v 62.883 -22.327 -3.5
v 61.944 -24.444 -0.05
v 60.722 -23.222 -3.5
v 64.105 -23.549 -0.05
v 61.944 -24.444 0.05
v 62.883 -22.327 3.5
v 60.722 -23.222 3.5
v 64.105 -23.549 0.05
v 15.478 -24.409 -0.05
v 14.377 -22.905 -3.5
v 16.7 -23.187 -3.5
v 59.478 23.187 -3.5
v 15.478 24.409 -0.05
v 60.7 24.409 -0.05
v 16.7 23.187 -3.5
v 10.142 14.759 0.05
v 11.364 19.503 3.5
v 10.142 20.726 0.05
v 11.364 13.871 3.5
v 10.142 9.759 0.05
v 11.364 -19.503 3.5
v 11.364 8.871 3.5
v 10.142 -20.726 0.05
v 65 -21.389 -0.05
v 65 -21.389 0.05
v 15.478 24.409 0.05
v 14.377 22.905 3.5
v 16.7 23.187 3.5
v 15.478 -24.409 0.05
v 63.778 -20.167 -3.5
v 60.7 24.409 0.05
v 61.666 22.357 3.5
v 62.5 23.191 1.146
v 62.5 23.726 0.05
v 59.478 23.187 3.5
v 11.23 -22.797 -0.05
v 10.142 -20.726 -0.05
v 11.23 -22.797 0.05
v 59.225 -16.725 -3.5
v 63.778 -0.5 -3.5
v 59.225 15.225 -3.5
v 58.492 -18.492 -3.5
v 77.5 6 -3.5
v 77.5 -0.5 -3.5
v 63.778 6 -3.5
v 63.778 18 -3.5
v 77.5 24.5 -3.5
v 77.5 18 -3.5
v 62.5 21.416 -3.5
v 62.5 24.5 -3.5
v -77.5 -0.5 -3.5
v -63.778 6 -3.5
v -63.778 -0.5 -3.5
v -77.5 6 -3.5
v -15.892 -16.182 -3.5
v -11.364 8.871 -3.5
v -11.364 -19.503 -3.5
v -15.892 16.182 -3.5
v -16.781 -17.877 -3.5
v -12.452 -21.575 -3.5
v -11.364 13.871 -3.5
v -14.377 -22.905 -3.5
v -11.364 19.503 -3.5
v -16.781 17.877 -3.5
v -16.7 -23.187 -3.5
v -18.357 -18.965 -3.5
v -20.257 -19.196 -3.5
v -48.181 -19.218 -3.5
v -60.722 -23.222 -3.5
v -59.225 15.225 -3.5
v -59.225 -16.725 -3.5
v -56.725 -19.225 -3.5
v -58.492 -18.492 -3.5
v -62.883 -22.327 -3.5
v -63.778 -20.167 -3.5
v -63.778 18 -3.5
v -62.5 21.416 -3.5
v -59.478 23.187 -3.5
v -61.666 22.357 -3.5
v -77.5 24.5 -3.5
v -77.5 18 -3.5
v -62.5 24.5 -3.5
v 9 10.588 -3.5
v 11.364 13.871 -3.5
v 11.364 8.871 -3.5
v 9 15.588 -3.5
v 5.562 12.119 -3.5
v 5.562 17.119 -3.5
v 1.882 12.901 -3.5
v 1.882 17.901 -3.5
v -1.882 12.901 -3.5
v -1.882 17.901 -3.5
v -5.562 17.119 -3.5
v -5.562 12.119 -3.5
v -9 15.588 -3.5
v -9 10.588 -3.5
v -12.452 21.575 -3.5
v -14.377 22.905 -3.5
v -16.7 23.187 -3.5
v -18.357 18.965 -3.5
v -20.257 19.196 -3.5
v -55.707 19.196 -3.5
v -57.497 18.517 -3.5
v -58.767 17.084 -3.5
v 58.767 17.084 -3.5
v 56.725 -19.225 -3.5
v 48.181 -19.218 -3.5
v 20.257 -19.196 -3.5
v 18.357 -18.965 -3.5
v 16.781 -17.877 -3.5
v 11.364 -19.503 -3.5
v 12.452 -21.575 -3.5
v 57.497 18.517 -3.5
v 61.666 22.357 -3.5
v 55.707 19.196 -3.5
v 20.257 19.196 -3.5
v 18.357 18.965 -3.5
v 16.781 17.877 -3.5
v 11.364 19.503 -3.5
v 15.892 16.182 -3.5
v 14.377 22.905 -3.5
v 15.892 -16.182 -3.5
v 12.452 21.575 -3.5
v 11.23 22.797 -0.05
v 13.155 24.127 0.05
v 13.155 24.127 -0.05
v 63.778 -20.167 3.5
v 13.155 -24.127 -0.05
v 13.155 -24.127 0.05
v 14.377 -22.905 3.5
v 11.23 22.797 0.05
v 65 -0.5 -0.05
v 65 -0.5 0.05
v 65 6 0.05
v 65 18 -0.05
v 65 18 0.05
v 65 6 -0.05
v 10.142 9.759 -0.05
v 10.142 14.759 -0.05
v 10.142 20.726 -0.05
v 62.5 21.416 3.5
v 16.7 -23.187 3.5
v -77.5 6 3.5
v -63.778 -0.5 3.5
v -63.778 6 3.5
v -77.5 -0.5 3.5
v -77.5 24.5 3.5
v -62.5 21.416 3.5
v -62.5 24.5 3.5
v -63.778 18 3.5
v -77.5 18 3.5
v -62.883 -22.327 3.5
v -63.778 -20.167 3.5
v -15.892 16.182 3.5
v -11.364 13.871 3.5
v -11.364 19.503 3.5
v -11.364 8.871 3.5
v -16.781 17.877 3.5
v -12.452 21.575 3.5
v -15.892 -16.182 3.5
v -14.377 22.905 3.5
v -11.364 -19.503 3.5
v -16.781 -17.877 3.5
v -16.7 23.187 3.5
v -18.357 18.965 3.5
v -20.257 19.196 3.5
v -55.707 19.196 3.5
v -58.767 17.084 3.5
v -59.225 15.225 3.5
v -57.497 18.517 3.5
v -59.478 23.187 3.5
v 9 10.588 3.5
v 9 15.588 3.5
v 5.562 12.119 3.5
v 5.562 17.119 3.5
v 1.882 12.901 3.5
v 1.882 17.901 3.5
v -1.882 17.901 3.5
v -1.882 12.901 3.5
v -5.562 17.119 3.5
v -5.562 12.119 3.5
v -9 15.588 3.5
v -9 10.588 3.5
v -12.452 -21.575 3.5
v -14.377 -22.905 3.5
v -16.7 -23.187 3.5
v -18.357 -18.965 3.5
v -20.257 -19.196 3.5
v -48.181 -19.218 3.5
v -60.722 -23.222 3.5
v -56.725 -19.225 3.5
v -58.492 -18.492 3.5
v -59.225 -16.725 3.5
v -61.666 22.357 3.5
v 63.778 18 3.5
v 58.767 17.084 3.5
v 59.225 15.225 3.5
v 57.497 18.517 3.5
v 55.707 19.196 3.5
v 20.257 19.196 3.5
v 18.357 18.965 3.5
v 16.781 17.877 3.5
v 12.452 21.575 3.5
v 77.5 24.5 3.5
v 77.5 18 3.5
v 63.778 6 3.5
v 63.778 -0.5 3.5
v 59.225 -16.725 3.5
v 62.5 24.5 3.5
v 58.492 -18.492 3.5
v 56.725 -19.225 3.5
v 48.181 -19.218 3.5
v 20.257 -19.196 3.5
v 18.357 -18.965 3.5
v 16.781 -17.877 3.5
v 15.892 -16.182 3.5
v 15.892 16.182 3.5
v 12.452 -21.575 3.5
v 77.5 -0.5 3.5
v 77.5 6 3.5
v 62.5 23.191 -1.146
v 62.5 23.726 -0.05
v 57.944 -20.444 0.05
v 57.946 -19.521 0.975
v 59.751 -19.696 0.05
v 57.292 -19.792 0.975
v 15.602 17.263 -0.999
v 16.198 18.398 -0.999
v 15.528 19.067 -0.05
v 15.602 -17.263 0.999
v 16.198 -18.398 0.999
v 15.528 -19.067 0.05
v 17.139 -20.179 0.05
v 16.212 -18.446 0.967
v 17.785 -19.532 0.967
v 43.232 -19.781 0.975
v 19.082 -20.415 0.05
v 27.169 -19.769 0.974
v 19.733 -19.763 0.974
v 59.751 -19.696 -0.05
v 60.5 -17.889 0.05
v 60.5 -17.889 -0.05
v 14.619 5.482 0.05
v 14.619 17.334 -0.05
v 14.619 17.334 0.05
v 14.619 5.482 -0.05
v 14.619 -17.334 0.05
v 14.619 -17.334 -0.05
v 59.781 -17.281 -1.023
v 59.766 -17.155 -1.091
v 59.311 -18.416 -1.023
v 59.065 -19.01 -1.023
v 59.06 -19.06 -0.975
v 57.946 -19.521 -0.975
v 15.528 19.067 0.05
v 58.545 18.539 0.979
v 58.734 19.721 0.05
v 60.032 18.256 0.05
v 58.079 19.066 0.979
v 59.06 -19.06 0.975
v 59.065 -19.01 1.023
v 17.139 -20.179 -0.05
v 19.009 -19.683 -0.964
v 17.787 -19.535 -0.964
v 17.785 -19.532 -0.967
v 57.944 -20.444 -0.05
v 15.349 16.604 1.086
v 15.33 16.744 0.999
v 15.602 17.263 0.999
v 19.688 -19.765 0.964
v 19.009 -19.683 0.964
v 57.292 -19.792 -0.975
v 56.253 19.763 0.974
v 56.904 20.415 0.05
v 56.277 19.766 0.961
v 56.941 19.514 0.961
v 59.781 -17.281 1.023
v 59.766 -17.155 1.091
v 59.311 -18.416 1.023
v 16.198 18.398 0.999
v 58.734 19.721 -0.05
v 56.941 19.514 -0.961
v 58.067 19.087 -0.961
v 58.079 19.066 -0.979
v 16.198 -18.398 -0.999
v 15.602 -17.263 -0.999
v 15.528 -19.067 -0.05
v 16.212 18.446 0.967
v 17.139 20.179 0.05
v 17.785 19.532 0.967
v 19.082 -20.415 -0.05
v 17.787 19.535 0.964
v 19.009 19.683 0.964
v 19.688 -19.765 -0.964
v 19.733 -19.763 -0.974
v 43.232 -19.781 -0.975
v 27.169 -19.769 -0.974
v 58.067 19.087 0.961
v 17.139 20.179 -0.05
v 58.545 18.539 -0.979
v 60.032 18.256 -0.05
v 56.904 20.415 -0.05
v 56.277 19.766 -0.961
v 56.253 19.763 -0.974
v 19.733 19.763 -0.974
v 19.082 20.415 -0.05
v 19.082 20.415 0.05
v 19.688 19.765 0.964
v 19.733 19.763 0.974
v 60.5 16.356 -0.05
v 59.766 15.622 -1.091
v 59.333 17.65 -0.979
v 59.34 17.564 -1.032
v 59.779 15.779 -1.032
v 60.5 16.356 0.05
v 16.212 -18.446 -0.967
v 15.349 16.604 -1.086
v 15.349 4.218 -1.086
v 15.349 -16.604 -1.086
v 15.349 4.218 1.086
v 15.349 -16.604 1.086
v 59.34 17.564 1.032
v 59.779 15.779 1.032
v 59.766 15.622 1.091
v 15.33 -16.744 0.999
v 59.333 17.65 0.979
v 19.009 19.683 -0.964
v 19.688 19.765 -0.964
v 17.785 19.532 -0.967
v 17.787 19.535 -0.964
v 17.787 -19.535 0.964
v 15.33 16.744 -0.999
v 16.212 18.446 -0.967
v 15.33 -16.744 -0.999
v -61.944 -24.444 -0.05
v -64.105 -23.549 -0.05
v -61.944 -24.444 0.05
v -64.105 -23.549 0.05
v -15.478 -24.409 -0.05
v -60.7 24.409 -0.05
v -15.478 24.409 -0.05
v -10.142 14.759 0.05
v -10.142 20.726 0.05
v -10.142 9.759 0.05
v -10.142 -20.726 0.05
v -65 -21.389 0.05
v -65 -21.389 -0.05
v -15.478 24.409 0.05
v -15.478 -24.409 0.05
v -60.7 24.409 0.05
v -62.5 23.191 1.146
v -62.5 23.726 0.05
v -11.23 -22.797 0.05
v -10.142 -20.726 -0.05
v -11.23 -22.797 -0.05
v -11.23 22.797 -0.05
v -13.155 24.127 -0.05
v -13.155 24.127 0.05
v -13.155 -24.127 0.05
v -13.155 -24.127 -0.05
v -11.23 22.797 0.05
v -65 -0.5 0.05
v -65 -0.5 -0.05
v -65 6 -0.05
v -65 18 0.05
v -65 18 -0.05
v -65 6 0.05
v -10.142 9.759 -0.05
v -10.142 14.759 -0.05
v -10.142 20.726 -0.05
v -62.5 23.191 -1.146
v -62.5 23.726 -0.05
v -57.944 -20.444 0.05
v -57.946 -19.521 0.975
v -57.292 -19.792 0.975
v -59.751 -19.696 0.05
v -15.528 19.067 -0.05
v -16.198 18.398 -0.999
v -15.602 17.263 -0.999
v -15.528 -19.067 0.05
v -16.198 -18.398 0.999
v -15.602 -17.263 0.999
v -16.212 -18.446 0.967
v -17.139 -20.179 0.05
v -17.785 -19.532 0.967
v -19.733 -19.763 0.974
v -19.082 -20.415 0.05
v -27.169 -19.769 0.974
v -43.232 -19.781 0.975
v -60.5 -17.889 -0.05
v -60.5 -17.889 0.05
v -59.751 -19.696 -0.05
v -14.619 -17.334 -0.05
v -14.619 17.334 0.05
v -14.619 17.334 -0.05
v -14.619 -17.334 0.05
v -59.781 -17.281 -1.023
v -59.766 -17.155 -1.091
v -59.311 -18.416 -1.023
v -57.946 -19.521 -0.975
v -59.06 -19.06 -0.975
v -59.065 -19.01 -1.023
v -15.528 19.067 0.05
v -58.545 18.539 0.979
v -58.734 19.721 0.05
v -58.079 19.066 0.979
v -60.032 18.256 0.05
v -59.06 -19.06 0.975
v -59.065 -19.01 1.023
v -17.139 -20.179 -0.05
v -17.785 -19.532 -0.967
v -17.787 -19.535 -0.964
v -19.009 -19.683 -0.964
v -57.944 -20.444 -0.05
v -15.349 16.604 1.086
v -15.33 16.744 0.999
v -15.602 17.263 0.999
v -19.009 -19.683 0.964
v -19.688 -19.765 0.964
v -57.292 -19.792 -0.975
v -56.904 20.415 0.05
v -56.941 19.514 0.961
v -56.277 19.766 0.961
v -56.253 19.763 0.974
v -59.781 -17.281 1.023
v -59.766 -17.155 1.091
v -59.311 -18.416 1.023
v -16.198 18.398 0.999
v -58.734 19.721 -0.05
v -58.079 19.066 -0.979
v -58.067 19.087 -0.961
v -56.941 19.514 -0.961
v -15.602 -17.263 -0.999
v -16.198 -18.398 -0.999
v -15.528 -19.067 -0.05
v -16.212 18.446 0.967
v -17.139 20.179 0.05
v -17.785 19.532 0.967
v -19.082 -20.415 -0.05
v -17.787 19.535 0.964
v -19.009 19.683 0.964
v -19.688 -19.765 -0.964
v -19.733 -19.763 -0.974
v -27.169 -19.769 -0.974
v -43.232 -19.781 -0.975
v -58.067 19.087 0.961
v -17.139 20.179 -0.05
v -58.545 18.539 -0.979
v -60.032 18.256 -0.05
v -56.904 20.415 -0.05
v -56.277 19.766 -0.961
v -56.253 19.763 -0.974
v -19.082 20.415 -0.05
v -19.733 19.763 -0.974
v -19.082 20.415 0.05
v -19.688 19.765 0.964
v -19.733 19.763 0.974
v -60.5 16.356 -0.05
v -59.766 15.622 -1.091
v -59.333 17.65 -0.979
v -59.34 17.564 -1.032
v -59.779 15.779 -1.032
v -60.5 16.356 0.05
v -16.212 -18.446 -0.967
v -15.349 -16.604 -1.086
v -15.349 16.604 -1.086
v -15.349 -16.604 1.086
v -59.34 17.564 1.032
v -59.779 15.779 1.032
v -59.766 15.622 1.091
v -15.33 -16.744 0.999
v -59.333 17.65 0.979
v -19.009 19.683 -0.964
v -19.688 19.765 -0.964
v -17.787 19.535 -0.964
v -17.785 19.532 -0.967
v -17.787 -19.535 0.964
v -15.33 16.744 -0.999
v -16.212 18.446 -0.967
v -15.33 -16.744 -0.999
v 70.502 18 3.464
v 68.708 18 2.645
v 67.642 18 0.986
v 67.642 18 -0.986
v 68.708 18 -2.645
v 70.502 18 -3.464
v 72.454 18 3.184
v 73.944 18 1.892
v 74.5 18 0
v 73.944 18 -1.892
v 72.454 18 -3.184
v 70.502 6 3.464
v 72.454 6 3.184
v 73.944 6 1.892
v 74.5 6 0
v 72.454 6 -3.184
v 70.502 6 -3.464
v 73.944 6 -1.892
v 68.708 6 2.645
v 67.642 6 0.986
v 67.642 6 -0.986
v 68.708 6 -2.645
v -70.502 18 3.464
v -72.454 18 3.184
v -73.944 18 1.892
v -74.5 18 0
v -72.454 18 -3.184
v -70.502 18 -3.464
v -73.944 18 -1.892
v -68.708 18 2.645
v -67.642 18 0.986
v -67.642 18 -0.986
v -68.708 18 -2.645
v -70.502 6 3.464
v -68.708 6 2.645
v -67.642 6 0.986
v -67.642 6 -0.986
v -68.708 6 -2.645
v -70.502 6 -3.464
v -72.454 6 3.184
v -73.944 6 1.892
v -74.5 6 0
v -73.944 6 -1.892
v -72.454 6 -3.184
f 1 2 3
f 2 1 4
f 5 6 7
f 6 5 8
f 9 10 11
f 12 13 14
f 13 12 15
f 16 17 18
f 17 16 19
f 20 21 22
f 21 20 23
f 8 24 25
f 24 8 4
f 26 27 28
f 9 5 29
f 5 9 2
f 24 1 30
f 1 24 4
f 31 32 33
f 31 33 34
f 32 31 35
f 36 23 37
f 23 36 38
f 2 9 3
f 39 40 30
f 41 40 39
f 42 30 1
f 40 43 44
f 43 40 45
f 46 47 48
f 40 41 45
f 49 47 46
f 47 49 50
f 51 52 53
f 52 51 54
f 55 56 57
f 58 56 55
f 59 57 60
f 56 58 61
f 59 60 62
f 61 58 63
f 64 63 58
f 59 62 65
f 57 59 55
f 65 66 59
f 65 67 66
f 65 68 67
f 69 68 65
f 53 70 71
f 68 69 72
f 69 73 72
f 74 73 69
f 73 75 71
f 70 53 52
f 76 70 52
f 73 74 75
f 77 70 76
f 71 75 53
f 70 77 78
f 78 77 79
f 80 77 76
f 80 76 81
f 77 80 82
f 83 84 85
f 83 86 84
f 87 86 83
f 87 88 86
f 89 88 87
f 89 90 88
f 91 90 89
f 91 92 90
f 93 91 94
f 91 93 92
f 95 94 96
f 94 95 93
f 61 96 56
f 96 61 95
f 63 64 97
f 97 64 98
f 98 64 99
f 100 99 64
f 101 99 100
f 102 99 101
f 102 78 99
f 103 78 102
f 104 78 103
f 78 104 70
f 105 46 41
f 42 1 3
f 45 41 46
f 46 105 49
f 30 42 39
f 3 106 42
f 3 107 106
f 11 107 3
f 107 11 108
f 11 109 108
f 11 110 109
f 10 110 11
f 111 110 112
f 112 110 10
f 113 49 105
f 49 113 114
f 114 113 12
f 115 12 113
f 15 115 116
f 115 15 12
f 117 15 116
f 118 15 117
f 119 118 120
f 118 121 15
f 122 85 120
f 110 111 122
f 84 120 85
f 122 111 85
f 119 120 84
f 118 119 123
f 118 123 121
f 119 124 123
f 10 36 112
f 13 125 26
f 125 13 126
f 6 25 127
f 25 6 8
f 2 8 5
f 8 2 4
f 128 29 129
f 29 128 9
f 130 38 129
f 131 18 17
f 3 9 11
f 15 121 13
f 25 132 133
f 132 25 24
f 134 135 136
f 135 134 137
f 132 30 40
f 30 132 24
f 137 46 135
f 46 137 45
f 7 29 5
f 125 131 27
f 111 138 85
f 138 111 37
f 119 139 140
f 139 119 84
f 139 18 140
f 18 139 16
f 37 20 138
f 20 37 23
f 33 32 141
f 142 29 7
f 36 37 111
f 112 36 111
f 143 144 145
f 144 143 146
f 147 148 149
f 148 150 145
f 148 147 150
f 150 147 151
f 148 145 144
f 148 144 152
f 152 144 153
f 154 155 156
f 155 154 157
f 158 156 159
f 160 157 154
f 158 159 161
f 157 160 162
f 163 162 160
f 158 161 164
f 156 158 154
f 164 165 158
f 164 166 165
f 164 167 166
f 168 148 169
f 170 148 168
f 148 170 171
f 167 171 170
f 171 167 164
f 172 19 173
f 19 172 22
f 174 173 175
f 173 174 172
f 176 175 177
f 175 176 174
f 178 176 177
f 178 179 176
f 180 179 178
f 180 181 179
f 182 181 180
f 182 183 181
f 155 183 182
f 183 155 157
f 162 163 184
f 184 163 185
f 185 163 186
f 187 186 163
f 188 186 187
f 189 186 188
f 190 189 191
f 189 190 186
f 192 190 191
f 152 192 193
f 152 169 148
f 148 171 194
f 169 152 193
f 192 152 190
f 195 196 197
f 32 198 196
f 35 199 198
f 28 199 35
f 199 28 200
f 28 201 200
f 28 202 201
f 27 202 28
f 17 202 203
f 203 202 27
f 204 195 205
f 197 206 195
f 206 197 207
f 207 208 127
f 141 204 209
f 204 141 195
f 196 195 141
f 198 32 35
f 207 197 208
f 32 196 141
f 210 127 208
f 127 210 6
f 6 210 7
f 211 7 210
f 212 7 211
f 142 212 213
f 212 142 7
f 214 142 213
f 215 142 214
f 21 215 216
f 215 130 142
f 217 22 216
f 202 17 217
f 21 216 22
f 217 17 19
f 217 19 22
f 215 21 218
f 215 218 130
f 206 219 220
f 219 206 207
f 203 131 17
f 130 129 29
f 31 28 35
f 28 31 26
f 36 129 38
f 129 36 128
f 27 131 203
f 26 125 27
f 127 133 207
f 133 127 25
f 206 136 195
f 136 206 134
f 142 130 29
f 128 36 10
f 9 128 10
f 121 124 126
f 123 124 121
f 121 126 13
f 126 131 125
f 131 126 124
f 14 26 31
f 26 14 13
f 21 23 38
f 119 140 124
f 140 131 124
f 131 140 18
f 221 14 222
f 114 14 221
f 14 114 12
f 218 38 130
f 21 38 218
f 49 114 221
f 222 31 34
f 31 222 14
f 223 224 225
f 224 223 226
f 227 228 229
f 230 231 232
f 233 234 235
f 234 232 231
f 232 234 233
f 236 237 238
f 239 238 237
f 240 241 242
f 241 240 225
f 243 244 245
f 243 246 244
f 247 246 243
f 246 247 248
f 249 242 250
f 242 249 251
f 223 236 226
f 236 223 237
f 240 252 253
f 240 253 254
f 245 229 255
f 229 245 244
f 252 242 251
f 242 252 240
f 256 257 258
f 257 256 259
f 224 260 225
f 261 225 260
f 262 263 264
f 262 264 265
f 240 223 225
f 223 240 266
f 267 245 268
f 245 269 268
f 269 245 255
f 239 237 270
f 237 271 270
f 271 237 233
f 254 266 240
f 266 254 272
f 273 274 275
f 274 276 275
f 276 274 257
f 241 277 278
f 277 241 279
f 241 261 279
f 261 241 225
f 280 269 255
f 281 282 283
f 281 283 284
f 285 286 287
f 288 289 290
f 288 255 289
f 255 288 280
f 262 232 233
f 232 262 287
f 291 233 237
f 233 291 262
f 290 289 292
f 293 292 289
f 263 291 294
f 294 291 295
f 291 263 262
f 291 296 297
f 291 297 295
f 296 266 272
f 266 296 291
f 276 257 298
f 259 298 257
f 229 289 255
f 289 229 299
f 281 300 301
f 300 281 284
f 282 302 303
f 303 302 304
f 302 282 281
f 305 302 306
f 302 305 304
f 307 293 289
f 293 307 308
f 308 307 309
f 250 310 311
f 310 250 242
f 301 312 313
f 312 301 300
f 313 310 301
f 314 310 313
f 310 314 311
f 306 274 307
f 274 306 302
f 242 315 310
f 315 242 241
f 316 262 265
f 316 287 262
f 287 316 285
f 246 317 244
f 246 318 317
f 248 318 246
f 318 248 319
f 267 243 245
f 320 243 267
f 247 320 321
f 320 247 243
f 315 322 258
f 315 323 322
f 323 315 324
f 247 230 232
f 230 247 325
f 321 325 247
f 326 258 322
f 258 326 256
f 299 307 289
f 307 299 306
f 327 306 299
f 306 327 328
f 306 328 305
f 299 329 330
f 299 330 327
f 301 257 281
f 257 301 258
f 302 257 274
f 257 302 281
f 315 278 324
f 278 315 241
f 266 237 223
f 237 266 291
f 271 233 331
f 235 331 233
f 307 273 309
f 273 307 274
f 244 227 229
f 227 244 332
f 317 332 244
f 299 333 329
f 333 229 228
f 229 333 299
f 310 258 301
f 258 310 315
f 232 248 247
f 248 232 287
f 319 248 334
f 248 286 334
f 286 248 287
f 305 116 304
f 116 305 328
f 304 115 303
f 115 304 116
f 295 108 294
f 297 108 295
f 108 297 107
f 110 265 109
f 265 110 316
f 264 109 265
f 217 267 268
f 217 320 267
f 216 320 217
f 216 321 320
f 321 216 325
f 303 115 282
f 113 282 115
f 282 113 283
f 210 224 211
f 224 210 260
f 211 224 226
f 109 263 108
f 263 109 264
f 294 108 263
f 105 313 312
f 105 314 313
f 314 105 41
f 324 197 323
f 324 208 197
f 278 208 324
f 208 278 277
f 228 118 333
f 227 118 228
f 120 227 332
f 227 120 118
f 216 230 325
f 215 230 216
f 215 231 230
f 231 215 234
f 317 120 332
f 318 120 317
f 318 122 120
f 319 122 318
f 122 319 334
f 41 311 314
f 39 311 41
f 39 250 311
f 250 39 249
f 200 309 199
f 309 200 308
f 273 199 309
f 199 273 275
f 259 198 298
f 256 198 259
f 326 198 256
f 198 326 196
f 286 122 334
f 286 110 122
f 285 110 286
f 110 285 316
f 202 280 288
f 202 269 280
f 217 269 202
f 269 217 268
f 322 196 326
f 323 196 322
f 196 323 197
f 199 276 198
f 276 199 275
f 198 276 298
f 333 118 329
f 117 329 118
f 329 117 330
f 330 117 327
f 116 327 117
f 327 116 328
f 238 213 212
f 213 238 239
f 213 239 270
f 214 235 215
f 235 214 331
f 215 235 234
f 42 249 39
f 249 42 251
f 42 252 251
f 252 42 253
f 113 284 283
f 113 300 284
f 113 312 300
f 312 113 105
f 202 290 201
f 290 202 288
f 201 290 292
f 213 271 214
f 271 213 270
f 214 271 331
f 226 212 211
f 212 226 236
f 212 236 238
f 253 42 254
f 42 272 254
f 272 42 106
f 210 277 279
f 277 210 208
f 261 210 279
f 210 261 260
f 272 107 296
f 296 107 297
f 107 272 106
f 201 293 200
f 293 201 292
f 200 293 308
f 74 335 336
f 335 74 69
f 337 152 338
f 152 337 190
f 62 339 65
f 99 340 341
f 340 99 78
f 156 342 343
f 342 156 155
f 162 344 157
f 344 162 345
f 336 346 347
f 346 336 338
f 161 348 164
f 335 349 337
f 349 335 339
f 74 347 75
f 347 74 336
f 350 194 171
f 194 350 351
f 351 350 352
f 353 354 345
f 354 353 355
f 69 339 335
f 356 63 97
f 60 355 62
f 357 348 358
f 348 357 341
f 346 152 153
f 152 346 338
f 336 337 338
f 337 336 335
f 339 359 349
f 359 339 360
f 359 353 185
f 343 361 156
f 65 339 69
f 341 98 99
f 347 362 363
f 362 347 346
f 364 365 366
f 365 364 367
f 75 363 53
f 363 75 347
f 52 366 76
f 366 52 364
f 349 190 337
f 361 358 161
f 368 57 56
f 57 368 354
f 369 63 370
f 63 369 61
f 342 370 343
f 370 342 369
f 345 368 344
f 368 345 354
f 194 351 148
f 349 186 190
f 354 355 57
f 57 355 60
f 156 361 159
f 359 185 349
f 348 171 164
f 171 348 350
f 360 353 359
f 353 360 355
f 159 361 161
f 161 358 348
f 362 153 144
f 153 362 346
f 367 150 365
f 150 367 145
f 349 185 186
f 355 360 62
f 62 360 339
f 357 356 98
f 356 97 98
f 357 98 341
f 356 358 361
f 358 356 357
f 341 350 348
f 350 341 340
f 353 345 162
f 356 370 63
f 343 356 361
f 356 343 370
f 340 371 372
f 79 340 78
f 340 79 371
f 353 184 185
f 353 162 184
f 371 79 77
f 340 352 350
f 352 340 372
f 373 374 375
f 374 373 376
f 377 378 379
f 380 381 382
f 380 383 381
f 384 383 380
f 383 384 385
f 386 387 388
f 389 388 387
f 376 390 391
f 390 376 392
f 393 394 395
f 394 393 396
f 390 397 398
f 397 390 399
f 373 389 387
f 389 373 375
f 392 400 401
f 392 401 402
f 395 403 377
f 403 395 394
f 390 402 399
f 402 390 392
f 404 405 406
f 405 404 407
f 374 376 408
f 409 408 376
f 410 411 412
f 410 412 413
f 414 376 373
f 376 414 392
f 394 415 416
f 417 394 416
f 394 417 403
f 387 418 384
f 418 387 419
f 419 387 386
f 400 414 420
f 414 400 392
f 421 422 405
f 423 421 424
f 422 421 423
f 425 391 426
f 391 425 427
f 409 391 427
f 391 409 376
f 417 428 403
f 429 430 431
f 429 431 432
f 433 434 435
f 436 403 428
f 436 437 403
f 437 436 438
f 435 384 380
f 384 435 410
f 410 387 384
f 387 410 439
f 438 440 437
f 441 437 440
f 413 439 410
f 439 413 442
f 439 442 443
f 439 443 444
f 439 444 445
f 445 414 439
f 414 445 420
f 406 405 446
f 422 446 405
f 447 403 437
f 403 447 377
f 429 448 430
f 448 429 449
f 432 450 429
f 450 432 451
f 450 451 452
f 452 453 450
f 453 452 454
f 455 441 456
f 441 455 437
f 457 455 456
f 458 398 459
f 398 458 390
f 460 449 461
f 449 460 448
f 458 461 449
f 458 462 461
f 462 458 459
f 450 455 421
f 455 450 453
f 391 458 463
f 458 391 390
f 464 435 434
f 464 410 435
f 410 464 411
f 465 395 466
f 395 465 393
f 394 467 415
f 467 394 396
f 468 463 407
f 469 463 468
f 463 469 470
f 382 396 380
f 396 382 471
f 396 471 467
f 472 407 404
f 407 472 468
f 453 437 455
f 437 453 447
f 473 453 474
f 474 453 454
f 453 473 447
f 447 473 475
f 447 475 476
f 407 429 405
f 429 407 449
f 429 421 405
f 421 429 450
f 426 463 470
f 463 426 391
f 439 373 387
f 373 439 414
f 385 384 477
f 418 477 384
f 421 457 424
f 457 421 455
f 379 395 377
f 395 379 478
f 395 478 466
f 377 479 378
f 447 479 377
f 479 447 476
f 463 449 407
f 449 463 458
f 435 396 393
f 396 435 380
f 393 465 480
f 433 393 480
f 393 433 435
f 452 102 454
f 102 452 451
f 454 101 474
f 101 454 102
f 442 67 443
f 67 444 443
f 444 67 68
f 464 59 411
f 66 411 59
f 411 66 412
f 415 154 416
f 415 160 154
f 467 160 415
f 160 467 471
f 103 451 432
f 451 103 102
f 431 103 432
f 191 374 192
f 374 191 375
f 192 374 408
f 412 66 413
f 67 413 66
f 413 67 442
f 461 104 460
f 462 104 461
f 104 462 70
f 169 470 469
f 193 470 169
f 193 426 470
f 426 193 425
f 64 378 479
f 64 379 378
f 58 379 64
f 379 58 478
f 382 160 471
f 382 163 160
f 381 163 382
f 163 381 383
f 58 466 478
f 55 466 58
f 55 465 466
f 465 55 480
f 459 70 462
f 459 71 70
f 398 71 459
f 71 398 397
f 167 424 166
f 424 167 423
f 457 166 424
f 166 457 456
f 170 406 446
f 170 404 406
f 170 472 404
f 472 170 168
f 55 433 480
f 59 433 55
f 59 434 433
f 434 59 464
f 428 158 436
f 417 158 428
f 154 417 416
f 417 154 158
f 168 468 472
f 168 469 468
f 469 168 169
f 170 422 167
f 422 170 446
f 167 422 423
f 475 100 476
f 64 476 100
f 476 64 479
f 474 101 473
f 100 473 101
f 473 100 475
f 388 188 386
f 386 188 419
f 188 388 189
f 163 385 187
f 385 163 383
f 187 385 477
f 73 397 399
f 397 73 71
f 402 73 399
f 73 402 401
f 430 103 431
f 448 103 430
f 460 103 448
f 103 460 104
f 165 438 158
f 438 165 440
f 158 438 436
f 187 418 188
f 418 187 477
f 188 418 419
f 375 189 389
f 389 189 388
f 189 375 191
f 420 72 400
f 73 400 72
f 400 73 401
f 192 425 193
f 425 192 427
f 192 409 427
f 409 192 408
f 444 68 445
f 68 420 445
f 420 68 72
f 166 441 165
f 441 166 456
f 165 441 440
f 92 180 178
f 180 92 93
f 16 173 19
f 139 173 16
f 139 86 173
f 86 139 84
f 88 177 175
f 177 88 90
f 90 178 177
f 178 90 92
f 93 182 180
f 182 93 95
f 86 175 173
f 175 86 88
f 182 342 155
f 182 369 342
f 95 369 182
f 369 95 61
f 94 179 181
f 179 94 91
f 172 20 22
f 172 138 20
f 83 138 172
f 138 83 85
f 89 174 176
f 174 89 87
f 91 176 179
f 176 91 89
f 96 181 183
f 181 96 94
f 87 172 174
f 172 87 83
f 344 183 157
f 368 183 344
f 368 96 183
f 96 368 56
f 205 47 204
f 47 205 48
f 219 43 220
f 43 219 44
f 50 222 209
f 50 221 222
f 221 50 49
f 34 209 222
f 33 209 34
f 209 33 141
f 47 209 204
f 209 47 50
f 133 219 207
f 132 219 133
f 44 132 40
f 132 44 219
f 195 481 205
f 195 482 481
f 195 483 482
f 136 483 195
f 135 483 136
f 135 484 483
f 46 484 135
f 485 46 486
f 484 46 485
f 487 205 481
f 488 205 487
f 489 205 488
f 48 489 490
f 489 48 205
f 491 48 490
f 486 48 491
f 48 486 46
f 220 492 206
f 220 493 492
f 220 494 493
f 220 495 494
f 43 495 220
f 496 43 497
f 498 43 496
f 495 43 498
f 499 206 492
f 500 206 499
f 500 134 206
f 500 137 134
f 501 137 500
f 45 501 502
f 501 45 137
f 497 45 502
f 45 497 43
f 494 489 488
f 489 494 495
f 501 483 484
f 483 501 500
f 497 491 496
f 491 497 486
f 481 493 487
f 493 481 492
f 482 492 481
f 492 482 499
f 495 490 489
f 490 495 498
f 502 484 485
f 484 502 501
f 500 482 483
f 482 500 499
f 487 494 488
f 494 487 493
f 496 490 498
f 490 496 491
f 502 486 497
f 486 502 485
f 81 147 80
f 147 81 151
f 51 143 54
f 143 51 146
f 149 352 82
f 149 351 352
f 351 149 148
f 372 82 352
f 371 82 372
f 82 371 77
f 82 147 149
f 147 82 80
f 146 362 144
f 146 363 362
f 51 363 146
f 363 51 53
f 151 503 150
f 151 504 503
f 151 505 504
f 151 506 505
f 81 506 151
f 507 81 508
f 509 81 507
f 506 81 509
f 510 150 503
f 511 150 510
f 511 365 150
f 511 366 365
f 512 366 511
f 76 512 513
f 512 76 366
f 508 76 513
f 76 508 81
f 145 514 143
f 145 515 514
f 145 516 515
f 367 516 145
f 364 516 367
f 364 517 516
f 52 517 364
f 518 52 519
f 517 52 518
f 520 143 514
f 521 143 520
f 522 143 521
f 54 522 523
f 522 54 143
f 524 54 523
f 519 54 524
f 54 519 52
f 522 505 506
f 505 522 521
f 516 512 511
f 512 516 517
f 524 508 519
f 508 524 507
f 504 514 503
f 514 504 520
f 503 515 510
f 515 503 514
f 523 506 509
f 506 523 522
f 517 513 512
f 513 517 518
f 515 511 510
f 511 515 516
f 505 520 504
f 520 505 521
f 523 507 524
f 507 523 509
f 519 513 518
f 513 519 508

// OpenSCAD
////////////glasses/////////////
ear_difference		= 0;
bridge_width			= 20;
bridge_position		= 0;
thickness				= 4;
frame_thickness		= 10;
frame_depth			= thickness+3;
groove_depth			= 1;
name					= "Ben Engel";
lense_thickness		= 3;
lense_height			= 20;
lense_width			= 45;
a =[8,8,8,5];	// these are the radius of the lenses starting
						// upper right, upper, left lower left, lower right
/*

optons for make are
"frame" will make just the face part that holds the lenses
"stems" this will make only the parts that go over your ears
"all" and this will make everything all in one file

*/
rotate =[0,0,0];
make	= "frame";

///////////////////////////////////////////////////////////////////////
///////////////////////////////////////////////////////////////////////
///////////////////////////////////////////////////////////////////////
//						EVERYTHING PAST HERE IS CODE						     //
///////////////////////////////////////////////////////////////////////
///////////////////////////////////////////////////////////////////////
///////////////////////////////////////////////////////////////////////










module lense(){
	hull(){
			translate([lense_width/2-(a[0]/2),lense_height-(a[0]/2),0]) cylinder(d=a[0], h=.1, center=true);
			translate([-lense_width/2+(a[1]/2),lense_height-(a[1]/2),0]) cylinder(d=a[1], h=.1, center=true);
			translate([-lense_width/2+(a[2]/2),-lense_height+(a[2]/2),0]) cylinder(d=a[2], h=.1, center=true);
			translate([lense_width/2-(a[3]/2),-lense_height+(a[3]/2),0]) cylinder(d=a[3], h=.1, center=true);

			translate([lense_width/2-(a[0]/2)-groove_depth,lense_height-(a[0]/2+groove_depth),0]) cylinder(d=a[0], h=lense_thickness, center=true);
			translate([-lense_width/2+(a[1]/2)+groove_depth,lense_height-(a[1]/2)-groove_depth,0]) cylinder(d=a[1], h=lense_thickness, center=true);
			translate([-lense_width/2+(a[2]/2)+groove_depth,-lense_height+(a[2]/2)+groove_depth,0]) cylinder(d=a[2], h=lense_thickness, center=true);
			translate([lense_width/2-(a[3]/2)-groove_depth,-lense_height+(a[3]/2)+groove_depth,0]) cylinder(d=a[3], h=lense_thickness, center=true);
	}
}
module lense_frame(){
	difference(){
		scale([(1/lense_width)*(lense_width+frame_thickness),(1/lense_width)*(lense_width+frame_thickness),1]) lense(lense_thickness=frame_depth);
		scale([(1/lense_width)*(lense_width+groove_depth),(1/lense_width)*(lense_width+groove_depth),1]) lense();
		lense(lense_thickness=frame_depth+2);
	}
}
module ear_stem_mount(){
	difference(){
		translate([lense_width+bridge_width+frame_thickness/2,lense_height-a[0],0]) cube([15,25,frame_depth], center=true);
		translate([lense_width+bridge_width+frame_thickness/2,lense_height-a[0],0]) cube([15,20-8,frame_depth+1], center=true);
	}
		translate([lense_width+bridge_width+frame_thickness/2+1,lense_height-a[0],0]) rotate([90,0,0]) cylinder(d=frame_depth, h=20-8, center=true);
}
module face(){
	translate([(lense_width+frame_thickness)/2+bridge_width/2,0,0]) lense_frame();
	translate([-(lense_width+frame_thickness)/2-bridge_width/2,0,0]) mirror() lense_frame();
	translate([0,bridge_position,0]) difference(){
		cylinder(d=bridge_width+(frame_thickness-groove_depth*2)*2,h=frame_depth, center=true);
		translate([0,-frame_thickness/2,0]) cylinder(d=bridge_width+(frame_thickness-groove_depth*2)*2,h=frame_depth+2, center=true);
		translate([(lense_width+frame_thickness)/2+bridge_width/2,0,0]) {
			scale([(1/lense_width)*(lense_width+groove_depth),(1/lense_width)*(lense_width+groove_depth),1]) lense();
			lense(lense_thickness=frame_depth+2);
		}
		translate([-((lense_width+frame_thickness)/2+bridge_width/2),0,0]) {
			scale([(1/lense_width)*(lense_width+groove_depth),(1/lense_width)*(lense_width+groove_depth),1]) lense();
			lense(lense_thickness=frame_depth+2);
		}

	}
	translate([0,ear_difference/2,0]) ear_stem_mount();
	translate([0,-ear_difference/2,0]) mirror(1,0,0) ear_stem_mount();
}
module ear_stem(){
	cube([150,10,frame_thickness], center=true);
	intersection(){
		difference(){
			translate([150/2,-(80/2)+5,0]) cylinder(d=80, h=frame_thickness, center=true);
			translate([150/2-frame_thickness,-(80/2)-frame_thickness/2,0]) cylinder(d=80, h=frame_thickness+1, center=true);

		}
		translate([150/2,-45,-25]) cube([150,150,50]);
	}
}
module finished_stem(){
	difference(){
		ear_stem();
		#translate([-150/2+7,0,0]) rotate([90,0,0]) {
		cylinder(d=frame_depth, h=20-8, center=true);
		translate([0,frame_depth,0]) cube([frame_depth-2,20-8,10],center=true);
		}
	}
}

module full_print_set(){
if(make=="frame" || make=="all")   {
	face();
}else if(make=="stems" || make=="all"){
	translate([0,lense_height+15,0]) finished_stem();
	translate([15,12,0]) mirror([0,0,1]) mirror([1,0,0]) mirror([0,1,0]) translate([0,lense_height+30,0]) finished_stem();
}
}

rotate(rotate) full_print_set();
